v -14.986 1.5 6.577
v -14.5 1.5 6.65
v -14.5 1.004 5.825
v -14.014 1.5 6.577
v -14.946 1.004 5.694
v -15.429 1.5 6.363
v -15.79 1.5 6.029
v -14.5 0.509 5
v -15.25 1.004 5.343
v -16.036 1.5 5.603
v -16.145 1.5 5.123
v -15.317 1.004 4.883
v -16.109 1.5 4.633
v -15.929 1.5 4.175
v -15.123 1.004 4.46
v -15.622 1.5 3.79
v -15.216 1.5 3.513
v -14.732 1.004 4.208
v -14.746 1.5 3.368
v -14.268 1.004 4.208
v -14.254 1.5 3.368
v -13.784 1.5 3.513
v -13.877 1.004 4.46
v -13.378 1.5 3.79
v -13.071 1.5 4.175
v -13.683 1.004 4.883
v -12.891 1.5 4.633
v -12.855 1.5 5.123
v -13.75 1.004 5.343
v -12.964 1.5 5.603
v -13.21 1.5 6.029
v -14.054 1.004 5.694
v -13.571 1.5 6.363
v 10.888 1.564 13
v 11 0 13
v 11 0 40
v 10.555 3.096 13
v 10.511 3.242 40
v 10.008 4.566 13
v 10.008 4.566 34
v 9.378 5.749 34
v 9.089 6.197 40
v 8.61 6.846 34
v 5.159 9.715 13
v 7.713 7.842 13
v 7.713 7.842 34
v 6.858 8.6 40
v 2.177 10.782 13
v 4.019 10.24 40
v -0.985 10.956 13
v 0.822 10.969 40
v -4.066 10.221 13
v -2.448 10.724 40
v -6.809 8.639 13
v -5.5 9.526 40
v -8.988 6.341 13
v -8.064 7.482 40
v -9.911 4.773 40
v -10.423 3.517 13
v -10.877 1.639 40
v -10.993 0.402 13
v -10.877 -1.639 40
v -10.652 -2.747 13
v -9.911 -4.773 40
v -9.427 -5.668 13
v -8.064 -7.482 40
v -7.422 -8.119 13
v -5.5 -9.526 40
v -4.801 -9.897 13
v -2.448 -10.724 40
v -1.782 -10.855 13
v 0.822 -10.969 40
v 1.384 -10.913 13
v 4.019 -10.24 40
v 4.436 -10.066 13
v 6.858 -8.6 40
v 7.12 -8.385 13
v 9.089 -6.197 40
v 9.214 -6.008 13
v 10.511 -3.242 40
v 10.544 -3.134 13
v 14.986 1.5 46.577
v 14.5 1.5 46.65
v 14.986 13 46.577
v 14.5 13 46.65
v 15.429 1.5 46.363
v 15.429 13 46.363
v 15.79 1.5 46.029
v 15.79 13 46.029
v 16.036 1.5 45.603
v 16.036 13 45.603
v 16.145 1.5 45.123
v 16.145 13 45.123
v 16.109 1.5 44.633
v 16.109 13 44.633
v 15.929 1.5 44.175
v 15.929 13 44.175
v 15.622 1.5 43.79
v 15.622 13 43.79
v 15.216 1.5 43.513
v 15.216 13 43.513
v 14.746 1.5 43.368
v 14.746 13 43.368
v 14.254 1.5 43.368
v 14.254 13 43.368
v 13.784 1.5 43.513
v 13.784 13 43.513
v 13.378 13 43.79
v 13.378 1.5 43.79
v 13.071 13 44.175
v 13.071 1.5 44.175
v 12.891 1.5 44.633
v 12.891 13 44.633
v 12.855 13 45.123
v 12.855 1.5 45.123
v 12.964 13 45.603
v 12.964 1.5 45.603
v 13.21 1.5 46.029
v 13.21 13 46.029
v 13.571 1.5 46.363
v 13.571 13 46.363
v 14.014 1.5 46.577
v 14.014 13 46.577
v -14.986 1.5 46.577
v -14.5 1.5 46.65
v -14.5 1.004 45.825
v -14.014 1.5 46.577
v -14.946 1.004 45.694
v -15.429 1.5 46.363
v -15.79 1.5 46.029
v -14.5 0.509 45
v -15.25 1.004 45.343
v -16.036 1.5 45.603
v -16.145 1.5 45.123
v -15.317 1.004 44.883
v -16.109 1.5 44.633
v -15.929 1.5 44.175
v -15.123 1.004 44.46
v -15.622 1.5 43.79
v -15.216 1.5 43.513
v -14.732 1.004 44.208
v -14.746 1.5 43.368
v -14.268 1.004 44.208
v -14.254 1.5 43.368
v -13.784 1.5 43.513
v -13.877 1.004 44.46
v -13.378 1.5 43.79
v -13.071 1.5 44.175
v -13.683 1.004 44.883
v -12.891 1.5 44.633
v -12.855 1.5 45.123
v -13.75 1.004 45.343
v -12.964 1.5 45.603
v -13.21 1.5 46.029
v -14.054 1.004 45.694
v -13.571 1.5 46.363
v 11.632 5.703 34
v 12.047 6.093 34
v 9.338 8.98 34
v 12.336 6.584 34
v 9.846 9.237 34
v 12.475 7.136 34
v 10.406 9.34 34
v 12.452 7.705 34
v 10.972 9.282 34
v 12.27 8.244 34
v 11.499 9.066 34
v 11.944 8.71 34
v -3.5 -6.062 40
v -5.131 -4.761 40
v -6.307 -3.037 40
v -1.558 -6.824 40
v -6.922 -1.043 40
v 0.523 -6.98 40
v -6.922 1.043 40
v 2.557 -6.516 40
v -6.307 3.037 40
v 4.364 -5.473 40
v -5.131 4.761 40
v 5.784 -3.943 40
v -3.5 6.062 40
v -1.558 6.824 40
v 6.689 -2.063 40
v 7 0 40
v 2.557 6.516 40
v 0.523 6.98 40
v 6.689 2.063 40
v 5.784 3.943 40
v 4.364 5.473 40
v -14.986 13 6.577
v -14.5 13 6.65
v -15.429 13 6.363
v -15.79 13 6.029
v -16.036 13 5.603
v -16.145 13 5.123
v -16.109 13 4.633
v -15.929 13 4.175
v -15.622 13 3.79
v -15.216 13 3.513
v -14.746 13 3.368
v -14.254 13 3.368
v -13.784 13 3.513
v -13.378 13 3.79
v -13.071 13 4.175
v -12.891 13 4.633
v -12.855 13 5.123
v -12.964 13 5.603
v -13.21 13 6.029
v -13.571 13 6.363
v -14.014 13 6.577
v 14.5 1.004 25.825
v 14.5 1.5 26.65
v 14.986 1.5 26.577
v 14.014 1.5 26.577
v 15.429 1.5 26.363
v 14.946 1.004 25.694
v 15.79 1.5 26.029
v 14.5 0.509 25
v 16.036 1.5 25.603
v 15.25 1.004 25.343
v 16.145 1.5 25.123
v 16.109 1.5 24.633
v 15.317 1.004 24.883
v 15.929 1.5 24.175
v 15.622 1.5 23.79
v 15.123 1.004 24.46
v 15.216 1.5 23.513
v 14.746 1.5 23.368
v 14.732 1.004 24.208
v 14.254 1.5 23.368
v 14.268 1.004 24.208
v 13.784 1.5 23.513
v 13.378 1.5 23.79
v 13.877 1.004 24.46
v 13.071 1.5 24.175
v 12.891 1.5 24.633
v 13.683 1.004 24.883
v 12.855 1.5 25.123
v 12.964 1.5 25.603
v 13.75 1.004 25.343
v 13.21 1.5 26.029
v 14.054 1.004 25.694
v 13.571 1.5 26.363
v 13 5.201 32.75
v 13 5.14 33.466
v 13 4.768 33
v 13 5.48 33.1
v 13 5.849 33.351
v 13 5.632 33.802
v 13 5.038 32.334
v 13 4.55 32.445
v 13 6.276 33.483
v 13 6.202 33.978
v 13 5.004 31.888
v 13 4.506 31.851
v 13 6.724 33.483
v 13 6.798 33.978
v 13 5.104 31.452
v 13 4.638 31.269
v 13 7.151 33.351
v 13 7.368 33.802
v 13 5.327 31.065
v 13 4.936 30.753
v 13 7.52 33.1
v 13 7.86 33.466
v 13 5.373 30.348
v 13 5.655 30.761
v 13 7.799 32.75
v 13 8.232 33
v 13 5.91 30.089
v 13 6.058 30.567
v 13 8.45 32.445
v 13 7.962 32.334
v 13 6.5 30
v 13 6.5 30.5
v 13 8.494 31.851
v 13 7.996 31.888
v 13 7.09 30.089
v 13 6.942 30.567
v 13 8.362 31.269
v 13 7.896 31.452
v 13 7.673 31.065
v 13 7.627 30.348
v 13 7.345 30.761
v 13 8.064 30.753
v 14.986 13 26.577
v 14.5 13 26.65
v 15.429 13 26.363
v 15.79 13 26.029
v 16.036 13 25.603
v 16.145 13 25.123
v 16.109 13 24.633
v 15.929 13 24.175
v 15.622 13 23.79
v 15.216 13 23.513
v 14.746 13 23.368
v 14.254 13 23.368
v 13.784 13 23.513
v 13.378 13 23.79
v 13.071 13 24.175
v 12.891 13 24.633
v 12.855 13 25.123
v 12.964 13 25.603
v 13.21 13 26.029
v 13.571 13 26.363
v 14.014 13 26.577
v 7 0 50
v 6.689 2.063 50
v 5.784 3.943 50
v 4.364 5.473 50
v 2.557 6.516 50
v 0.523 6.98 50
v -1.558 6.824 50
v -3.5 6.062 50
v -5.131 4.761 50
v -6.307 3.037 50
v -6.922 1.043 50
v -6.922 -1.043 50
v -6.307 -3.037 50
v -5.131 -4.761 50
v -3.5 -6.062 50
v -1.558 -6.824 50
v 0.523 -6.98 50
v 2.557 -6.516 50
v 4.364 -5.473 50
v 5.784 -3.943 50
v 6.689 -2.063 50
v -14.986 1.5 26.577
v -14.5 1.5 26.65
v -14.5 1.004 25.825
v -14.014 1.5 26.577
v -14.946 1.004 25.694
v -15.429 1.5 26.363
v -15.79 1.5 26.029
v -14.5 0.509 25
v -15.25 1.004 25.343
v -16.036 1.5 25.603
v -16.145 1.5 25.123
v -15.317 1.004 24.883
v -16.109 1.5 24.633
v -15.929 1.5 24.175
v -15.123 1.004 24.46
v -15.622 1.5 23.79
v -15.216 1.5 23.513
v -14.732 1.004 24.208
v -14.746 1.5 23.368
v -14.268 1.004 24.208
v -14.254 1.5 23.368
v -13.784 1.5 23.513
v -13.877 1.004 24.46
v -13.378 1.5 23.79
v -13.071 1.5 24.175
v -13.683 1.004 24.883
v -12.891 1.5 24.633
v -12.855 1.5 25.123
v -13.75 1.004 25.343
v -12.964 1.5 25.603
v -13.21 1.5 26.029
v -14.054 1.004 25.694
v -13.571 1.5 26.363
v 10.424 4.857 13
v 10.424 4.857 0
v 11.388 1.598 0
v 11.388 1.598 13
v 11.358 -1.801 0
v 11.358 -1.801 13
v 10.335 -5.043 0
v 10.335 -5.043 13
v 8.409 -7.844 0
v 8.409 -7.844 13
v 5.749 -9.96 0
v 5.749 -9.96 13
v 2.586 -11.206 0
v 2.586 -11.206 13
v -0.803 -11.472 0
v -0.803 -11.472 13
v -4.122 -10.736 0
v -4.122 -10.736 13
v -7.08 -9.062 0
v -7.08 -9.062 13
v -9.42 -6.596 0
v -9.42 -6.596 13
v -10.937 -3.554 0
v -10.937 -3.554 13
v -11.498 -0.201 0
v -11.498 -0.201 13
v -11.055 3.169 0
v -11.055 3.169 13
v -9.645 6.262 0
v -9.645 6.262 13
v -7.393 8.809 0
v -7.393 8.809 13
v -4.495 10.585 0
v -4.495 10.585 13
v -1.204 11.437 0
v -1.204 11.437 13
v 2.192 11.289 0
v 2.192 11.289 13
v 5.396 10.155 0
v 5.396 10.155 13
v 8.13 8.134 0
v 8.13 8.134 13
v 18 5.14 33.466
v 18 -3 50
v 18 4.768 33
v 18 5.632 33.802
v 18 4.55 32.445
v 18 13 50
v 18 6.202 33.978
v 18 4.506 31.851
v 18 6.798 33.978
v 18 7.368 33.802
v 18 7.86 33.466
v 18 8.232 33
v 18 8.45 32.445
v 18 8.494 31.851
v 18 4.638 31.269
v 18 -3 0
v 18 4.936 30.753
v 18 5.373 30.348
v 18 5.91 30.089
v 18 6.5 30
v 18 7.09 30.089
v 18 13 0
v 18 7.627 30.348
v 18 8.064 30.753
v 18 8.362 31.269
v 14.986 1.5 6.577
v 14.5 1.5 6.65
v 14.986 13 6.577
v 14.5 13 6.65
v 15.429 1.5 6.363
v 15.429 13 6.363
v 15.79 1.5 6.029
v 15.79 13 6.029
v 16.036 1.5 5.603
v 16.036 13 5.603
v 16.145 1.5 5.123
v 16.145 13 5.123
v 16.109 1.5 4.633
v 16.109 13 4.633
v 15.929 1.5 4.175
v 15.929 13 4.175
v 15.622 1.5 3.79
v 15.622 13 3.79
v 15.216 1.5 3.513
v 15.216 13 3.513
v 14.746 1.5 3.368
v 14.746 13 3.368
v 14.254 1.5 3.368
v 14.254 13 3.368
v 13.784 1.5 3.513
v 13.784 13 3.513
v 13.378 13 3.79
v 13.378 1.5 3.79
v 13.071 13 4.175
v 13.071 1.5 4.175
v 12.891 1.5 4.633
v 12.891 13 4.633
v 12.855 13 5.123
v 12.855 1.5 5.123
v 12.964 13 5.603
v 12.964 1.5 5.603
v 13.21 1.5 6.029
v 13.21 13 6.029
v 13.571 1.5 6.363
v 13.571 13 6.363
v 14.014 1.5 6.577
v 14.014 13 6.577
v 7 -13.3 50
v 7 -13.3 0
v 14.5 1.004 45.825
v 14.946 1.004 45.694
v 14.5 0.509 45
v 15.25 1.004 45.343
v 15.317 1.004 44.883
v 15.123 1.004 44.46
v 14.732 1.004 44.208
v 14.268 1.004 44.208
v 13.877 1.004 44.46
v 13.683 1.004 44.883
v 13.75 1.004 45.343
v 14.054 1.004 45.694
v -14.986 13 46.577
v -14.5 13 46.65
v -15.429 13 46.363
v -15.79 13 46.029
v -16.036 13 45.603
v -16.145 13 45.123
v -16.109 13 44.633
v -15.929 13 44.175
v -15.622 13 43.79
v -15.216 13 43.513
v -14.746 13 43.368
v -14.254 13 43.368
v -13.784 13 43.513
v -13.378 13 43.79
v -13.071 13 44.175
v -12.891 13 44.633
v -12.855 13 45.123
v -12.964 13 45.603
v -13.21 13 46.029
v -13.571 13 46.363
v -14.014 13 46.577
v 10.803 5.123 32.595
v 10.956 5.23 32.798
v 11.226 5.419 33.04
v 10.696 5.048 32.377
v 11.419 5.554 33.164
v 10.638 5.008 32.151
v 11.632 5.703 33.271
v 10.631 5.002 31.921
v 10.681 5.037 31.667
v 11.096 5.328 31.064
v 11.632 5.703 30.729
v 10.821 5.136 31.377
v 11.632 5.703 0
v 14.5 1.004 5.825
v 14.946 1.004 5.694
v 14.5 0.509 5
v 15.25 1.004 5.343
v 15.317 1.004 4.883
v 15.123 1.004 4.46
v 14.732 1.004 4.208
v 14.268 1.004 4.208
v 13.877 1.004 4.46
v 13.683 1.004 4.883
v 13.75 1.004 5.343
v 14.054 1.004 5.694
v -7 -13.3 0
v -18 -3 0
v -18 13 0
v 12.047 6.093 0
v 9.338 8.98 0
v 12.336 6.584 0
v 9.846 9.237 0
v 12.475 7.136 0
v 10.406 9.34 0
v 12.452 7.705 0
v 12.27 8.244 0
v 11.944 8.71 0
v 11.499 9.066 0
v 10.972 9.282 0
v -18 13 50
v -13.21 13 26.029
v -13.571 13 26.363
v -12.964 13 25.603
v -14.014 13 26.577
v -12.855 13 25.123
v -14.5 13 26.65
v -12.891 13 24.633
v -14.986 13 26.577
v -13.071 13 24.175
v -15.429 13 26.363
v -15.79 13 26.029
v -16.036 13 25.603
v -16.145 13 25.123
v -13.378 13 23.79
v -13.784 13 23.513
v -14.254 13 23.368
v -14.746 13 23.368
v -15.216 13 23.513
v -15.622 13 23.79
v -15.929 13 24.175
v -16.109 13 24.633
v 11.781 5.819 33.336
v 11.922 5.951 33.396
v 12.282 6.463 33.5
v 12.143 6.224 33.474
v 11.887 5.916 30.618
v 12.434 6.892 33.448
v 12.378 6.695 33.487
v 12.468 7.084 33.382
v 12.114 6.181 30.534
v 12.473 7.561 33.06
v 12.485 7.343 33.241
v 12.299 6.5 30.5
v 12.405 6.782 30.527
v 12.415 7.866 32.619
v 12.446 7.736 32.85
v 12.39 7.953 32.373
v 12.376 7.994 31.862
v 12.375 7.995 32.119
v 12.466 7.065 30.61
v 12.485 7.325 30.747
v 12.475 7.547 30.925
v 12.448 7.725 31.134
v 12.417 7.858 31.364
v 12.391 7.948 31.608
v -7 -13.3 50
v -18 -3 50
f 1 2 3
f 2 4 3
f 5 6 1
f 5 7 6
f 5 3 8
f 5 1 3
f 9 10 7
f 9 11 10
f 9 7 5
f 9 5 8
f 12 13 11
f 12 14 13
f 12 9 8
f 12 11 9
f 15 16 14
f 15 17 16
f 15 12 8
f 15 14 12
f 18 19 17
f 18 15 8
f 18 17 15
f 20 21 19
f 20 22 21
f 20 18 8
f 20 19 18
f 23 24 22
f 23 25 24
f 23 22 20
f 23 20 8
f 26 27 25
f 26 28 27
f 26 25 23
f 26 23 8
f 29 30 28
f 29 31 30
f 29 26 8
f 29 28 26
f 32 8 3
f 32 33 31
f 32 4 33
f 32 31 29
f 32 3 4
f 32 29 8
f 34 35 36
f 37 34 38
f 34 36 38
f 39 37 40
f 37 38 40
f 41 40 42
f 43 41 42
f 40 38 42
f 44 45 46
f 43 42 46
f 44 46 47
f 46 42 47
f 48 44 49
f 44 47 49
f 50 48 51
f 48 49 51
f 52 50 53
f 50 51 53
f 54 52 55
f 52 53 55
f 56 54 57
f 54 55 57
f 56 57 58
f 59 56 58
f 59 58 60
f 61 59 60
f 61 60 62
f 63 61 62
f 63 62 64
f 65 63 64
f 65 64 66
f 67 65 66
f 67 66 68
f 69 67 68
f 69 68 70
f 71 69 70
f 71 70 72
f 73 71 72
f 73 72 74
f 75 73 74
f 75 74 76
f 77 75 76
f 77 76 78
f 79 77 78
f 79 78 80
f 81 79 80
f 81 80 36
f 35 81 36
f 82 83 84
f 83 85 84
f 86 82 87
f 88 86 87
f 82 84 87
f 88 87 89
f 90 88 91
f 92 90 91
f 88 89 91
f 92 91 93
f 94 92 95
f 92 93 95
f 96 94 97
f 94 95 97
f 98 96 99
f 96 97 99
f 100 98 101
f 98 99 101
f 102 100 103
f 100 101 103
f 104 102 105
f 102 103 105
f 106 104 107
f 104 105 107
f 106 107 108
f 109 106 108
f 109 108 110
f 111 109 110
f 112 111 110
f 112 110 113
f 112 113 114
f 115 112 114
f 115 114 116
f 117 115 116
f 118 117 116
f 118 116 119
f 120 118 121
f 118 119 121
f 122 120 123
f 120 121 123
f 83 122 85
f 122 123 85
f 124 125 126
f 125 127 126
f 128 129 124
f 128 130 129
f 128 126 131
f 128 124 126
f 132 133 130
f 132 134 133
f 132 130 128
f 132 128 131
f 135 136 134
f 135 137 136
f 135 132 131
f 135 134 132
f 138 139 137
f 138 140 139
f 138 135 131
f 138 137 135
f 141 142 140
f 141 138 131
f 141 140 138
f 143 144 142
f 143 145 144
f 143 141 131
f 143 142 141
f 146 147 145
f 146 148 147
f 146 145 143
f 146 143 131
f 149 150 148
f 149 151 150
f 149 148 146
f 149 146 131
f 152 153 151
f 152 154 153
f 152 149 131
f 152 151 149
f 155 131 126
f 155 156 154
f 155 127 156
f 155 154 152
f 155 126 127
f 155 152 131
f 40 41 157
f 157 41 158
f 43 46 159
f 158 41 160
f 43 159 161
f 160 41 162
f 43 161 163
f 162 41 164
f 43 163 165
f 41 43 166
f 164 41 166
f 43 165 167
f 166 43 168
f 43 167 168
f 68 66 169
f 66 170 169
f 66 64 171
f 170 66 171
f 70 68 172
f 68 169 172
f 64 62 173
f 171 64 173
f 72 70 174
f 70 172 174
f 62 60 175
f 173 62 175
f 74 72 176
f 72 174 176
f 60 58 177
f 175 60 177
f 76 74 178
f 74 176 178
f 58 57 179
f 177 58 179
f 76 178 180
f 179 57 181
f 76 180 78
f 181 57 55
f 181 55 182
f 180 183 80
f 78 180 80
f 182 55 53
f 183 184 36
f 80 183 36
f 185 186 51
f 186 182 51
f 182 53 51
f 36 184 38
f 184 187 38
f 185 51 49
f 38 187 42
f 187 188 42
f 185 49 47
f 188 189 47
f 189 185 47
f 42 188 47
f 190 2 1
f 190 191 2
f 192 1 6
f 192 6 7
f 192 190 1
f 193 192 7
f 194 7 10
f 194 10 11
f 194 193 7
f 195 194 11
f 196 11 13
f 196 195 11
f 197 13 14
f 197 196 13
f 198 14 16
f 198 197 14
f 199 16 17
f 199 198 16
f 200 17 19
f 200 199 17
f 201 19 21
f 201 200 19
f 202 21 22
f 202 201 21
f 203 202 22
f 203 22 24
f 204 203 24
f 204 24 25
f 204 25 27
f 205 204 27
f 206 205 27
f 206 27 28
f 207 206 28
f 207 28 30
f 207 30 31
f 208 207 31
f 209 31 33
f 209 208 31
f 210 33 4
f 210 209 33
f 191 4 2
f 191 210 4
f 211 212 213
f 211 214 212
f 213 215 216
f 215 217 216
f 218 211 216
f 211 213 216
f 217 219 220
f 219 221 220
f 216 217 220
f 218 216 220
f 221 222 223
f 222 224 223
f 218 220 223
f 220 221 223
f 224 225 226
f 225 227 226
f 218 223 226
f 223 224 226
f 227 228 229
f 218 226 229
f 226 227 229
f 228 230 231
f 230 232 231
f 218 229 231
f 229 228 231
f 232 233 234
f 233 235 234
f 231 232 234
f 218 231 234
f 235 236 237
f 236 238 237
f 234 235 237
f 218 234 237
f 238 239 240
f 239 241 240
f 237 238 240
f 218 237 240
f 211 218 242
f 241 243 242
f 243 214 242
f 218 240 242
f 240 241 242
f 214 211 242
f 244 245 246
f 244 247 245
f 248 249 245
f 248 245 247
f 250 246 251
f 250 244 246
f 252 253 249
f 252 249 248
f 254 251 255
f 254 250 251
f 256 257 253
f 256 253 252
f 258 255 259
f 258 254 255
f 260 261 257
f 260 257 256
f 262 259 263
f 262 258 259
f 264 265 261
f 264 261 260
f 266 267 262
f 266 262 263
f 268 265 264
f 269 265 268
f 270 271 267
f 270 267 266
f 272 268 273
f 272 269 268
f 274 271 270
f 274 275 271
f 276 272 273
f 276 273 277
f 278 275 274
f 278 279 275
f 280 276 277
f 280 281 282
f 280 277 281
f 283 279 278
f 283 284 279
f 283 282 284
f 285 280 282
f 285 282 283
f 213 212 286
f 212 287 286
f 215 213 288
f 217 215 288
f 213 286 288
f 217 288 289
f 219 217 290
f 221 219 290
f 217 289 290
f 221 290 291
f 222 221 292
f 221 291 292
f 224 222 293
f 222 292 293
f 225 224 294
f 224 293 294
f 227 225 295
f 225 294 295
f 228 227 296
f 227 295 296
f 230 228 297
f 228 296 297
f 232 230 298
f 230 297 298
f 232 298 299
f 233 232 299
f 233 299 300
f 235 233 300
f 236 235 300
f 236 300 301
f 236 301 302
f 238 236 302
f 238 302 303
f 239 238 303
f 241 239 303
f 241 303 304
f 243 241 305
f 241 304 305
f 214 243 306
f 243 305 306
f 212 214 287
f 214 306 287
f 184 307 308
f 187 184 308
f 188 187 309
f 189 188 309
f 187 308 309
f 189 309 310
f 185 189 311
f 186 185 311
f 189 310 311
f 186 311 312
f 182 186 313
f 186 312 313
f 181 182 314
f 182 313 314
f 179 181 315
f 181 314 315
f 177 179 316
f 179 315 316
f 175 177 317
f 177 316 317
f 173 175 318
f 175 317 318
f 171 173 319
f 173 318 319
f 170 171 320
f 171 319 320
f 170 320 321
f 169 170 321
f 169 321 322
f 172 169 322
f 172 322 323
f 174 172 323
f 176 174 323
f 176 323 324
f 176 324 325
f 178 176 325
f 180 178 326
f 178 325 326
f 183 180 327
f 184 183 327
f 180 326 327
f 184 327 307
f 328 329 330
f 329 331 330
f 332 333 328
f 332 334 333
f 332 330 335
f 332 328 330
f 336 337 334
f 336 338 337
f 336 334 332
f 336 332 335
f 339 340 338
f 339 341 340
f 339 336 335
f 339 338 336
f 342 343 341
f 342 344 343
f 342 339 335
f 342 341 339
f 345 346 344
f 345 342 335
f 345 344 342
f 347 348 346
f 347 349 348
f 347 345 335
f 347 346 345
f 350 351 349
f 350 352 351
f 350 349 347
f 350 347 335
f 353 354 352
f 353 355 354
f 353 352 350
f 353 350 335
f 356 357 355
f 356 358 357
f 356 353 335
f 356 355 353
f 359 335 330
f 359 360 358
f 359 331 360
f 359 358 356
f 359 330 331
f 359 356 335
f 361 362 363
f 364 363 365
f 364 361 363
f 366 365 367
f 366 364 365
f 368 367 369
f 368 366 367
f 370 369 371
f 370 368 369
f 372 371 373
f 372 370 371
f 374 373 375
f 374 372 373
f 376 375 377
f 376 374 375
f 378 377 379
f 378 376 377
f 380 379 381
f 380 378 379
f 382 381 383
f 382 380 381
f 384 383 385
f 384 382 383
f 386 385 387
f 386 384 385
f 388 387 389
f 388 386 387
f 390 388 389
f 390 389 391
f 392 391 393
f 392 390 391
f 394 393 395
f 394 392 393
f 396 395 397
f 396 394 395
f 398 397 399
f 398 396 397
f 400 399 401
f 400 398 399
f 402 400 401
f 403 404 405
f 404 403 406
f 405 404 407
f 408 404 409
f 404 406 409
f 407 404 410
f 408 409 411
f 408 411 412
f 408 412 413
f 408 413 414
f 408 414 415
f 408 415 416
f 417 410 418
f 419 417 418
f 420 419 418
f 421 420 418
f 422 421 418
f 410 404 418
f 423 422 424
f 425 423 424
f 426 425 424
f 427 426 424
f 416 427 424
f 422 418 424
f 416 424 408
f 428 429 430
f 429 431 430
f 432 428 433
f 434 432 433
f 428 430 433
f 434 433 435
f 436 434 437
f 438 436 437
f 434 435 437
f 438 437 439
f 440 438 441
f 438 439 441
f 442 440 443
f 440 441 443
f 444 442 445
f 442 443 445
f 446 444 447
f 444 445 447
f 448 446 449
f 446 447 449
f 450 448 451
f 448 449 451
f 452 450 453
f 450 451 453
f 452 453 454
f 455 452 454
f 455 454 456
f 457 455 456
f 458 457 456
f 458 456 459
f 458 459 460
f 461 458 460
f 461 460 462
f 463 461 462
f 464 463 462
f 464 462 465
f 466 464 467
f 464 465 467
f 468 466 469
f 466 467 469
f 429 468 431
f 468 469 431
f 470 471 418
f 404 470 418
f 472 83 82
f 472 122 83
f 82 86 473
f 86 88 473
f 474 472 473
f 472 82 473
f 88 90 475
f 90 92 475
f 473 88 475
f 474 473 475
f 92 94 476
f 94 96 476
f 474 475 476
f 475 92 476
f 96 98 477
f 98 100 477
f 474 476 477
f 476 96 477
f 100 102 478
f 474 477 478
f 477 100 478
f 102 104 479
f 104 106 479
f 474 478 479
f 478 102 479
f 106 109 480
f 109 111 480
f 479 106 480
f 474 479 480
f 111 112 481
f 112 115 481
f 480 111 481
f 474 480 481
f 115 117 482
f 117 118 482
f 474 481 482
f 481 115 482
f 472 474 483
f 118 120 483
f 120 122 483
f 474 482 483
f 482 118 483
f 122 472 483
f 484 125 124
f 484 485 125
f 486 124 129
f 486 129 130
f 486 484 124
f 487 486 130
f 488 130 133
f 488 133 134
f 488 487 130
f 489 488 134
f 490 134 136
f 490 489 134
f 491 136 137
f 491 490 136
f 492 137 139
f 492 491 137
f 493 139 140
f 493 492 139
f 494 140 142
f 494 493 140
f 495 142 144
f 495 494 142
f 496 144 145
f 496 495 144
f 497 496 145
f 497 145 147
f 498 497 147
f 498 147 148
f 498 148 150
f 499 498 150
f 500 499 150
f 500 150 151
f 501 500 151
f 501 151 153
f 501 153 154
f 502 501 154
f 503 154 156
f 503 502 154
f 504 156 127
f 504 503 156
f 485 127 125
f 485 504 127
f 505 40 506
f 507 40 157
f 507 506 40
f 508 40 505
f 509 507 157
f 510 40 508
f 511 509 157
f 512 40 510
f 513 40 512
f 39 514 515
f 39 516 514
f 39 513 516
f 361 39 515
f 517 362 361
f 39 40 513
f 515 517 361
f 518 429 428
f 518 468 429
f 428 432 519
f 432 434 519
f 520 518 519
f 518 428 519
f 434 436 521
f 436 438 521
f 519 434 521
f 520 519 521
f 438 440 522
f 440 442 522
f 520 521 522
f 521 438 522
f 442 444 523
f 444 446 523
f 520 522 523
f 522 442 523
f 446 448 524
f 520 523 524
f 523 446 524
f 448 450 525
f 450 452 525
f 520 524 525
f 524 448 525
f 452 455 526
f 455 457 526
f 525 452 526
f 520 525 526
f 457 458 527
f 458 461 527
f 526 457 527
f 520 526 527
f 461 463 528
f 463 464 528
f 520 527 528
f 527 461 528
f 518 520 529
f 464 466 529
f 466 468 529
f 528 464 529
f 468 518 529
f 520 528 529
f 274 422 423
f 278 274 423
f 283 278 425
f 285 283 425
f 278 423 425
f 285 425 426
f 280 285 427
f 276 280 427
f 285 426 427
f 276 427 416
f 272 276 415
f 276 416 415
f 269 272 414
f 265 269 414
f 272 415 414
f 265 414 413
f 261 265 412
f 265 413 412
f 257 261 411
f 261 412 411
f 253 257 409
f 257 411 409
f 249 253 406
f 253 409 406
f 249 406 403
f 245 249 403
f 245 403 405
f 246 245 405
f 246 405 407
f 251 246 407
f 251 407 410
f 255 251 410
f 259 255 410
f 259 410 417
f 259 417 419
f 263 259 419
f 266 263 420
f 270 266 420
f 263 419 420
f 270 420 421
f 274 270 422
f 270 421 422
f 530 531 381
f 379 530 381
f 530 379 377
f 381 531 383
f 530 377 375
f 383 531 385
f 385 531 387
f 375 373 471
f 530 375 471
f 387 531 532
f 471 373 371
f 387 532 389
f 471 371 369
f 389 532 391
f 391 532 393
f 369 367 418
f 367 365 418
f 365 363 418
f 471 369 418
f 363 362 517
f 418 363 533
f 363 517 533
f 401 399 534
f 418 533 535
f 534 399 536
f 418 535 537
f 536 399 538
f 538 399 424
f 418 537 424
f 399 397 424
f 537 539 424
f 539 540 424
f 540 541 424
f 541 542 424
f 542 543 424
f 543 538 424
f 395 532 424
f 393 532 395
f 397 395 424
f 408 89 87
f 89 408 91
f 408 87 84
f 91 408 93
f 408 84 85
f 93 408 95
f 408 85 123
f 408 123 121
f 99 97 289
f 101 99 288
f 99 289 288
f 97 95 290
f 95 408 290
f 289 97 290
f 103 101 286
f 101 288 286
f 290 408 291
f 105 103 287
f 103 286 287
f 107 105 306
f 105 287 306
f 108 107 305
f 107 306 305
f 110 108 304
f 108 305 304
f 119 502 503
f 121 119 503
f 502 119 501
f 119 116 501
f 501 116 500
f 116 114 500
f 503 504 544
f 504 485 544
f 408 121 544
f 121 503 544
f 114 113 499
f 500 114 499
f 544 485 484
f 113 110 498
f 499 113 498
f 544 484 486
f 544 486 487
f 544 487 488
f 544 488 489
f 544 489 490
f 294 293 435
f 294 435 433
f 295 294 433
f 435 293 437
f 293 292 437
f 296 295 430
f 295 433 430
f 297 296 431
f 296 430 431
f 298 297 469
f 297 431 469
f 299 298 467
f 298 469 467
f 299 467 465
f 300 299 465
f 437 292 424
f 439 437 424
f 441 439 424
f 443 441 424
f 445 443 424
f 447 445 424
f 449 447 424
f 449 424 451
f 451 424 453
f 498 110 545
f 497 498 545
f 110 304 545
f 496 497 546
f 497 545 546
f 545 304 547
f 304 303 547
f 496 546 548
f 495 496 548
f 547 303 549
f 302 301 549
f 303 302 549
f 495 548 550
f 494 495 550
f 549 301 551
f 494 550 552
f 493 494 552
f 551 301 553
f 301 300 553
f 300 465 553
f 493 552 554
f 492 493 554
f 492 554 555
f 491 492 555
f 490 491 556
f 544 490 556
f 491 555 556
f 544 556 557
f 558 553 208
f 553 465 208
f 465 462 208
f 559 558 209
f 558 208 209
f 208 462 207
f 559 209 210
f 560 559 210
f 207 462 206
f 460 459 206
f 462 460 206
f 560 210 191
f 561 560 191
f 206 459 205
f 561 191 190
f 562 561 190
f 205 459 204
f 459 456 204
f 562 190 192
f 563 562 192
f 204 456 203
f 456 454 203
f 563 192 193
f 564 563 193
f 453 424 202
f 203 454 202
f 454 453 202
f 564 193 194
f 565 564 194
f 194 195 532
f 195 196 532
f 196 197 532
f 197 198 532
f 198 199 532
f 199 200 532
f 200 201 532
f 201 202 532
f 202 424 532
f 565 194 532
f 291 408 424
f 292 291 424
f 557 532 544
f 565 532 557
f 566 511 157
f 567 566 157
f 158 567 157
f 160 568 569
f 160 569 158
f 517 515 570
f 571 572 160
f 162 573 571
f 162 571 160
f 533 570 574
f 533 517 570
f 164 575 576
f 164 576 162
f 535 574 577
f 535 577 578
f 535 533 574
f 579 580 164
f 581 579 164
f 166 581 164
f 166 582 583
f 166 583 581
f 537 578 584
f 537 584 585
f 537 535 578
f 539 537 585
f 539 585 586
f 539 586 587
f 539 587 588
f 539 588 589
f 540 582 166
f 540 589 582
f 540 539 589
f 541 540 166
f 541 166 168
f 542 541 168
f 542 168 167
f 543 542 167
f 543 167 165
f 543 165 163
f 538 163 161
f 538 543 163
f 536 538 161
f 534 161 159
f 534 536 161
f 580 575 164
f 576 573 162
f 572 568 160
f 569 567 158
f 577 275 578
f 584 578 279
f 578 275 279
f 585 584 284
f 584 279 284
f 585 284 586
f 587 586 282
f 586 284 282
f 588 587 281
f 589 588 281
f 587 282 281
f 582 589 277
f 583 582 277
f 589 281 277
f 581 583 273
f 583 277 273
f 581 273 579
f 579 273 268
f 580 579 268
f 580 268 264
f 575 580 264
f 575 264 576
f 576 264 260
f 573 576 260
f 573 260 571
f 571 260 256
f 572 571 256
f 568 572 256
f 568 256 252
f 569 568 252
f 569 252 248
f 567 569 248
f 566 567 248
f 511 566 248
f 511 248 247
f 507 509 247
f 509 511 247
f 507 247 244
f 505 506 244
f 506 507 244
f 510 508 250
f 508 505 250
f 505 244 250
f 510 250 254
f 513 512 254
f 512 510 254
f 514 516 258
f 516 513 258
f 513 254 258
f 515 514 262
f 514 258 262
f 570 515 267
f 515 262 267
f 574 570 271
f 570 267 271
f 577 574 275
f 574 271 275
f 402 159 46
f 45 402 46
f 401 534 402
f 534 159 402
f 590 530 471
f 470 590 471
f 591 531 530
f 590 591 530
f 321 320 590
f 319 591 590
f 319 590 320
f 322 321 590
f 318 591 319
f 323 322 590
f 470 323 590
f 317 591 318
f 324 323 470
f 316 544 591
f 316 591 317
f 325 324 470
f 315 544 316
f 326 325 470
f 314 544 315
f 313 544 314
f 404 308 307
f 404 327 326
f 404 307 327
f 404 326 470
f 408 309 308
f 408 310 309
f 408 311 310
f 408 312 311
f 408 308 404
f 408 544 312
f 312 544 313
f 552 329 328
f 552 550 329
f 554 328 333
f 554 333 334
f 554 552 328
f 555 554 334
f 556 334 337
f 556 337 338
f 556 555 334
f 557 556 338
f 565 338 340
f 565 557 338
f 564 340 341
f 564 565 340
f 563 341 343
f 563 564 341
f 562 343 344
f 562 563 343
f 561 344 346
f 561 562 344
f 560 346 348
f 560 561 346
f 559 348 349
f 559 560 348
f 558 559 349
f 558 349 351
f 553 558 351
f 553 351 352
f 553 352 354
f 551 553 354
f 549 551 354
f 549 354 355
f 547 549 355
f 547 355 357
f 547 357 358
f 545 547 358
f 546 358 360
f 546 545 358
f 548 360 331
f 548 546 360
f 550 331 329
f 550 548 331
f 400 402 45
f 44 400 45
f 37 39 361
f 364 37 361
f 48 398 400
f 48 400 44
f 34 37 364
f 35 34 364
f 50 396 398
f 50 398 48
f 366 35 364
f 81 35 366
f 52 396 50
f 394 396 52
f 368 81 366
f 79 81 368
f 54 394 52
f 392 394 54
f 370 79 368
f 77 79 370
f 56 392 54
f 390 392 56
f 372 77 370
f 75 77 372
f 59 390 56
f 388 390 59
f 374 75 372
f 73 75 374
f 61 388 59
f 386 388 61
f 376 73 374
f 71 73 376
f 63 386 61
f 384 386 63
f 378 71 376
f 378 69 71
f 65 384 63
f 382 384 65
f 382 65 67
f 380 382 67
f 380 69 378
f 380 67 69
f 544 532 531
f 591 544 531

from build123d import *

# Parameters (mm, degrees)
EXTRUDE_1_DEPTH             = 50
SKETCH_2_OUTSIDE_W          = 51.398
SKETCH_2_OUTSIDE_H          = 41.698
SKETCH_2_OUTSIDE_R          = 7
CUT_EXTRUDE_3_DEPTH         = 10
SKETCH_5_R                  = 11
CUT_EXTRUDE_5_DEPTH         = 27
HOLE_WIZARD_M4_1_AT_2_COUNT = 2
HOLE_WIZARD_M4_1_AT_2_PITCH = 20
HOLE_WIZARD_M4_1_AT_3_COUNT = 2
HOLE_WIZARD_M4_1_AT_3_PITCH = 40
CUT_EXTRUDE_1_DEPTH         = 34
HOLE_WIZARD_3_0_3_1_REACH   = 65.031
HOLE_WIZARD_3_0_3_1_BORE_R  = 1.5
SKETCH_65_R                 = 2
CUT_EXTRUDE_2_DEPTH         = 5


with BuildPart() as part:
    # 草图1 → 拉伸1 (new body)
    with BuildSketch(Plane.XY):
        Polygon((-18, 13), (-18, -3), (-7, -13.3), (7, -13.3), (18, -3), (18, 13), align=None)
    extrude(amount=EXTRUDE_1_DEPTH)

    # 草图2 outside → 拉伸3 (cut)
    # profile 1 of 2: a face of its own
    with BuildSketch(Plane.XY.offset(50)):
        with Locations((0, -0.15)):
            Rectangle(SKETCH_2_OUTSIDE_W, SKETCH_2_OUTSIDE_H)
        Polygon((18, -3), (18, 13), (-18, 13), (-18, -3), (-7, -13.3), (7, -13.3), align=None, mode=Mode.SUBTRACT)
    # profile 2 of 2: a face of its own
    with BuildSketch(Plane.XY.offset(50)):
        Circle(SKETCH_2_OUTSIDE_R)
    extrude(amount=-CUT_EXTRUDE_3_DEPTH, mode=Mode.SUBTRACT)

    # 草图5 → 拉伸5 (cut)
    with BuildSketch(Plane.XY.offset(40)):
        Circle(SKETCH_5_R)
    extrude(amount=-CUT_EXTRUDE_5_DEPTH, mode=Mode.SUBTRACT)

    # 草图57 → M24 螺纹孔1 (revolve, cut)
    with BuildSketch(Plane(origin=(0, 0, 13), x_dir=(0, -1, 0), z_dir=(1, 0, 0))):
        Polygon((0, 0), (0, 19.909897119), (11.5, 13), (11.5, 0), align=None)
    revolve(axis=Axis((0, 0, 19.35), (0, 0, -1)), mode=Mode.SUBTRACT)

    # 草图58 → M4 螺纹孔1 (revolve, cut)
    with BuildSketch(Plane(origin=(-14.5, 13, 5), x_dir=(0, 0, 1), z_dir=(1, 0, 0))):
        Polygon((0, 0), (0, 12.491420021), (1.65, 11.5), (1.65, 0), align=None)
    hole_wizard_m4_1 = revolve(axis=Axis((-14.5, 19.35, 5), (0, -1, 0)), mode=Mode.SUBTRACT)

    # M4 螺纹孔1 at 2: M4 螺纹孔1 ×2
    with Locations(*[(0, 0, i * HOLE_WIZARD_M4_1_AT_2_PITCH) for i in range(1, HOLE_WIZARD_M4_1_AT_2_COUNT)]):
        add(hole_wizard_m4_1, mode=Mode.SUBTRACT)

    # M4 螺纹孔1 at 3: M4 螺纹孔1 ×2
    with Locations(*[(0, 0, i * HOLE_WIZARD_M4_1_AT_3_PITCH) for i in range(1, HOLE_WIZARD_M4_1_AT_3_COUNT)]):
        add(hole_wizard_m4_1, mode=Mode.SUBTRACT)

    # 镜向1: M4 螺纹孔1 across plane
    add(hole_wizard_m4_1.mirror(Plane(origin=(0, 0, 0), x_dir=(0, 0, 1), z_dir=(1, 0, 0))), mode=Mode.SUBTRACT)

    # 镜向1 copy 1 sketch → 镜向1 copy 1 (revolve, cut)
    with BuildSketch(Plane(origin=(14.5, 13, 25), x_dir=(0, 0, 1), z_dir=(-1, 0, 0))):
        Polygon((0, 0), (0, -12.491420021), (1.65, -11.5), (1.65, 0), align=None)
    revolve(axis=Axis((14.5, 19.35, 25), (0, 1, 0)), mode=Mode.SUBTRACT)

    # 镜向1 copy 2 sketch → 镜向1 copy 2 (revolve, cut)
    with BuildSketch(Plane(origin=(14.5, 13, 45), x_dir=(0, 0, 1), z_dir=(-1, 0, 0))):
        Polygon((0, 0), (0, -12.491420021), (1.65, -11.5), (1.65, 0), align=None)
    revolve(axis=Axis((14.5, 19.35, 45), (0, 1, 0)), mode=Mode.SUBTRACT)

    # 草图61 → 切除-拉伸1 (cut)
    with BuildSketch(Plane(origin=(0, 0, 0), x_dir=(-1, 0, 0), z_dir=(0, 0, -1))):
        with BuildLine():
            Line((-9.337993294, 8.980082474), (1.147152873, 1.638304089))
            ThreePointArc((1.147152873, 1.638304089), (1.638304089, -1.147152873), (-1.147152873, -1.638304089))
            Line((-1.147152873, -1.638304089), (-11.63229904, 5.703474297))
            ThreePointArc((-11.63229904, 5.703474297), (-12.123450255, 8.488931258), (-9.337993294, 8.980082474))
        make_face()
    extrude(amount=-CUT_EXTRUDE_1_DEPTH, mode=Mode.SUBTRACT)

    # Ø3.0 (3) 直径孔1 bore → Ø3.0 (3) 直径孔1 (cut, up to next)
    with BuildSketch(Plane(origin=(18, 0, 0), x_dir=(0, 0, -1), z_dir=(1, 0, 0)), mode=Mode.PRIVATE) as hole_wizard_3_0_3_1_sk1:
        with Locations((-32, 6.5)):
            Circle(HOLE_WIZARD_3_0_3_1_BORE_R)
    hole_wizard_3_0_3_1_tool1 = extrude(hole_wizard_3_0_3_1_sk1.sketch, amount=-HOLE_WIZARD_3_0_3_1_REACH, mode=Mode.PRIVATE) & part.part
    add(hole_wizard_3_0_3_1_tool1.solids().sort_by_distance((18, 6.5, 32))[0], mode=Mode.SUBTRACT)

    # 草图65 → 切除-拉伸2 (cut)
    with BuildSketch(Plane(origin=(18, 0, 0), x_dir=(0, 0, -1), z_dir=(1, 0, 0))):
        with Locations((-32, 6.5)):
            Circle(SKETCH_65_R)
    extrude(amount=-CUT_EXTRUDE_2_DEPTH, mode=Mode.SUBTRACT)


solid = part.part
